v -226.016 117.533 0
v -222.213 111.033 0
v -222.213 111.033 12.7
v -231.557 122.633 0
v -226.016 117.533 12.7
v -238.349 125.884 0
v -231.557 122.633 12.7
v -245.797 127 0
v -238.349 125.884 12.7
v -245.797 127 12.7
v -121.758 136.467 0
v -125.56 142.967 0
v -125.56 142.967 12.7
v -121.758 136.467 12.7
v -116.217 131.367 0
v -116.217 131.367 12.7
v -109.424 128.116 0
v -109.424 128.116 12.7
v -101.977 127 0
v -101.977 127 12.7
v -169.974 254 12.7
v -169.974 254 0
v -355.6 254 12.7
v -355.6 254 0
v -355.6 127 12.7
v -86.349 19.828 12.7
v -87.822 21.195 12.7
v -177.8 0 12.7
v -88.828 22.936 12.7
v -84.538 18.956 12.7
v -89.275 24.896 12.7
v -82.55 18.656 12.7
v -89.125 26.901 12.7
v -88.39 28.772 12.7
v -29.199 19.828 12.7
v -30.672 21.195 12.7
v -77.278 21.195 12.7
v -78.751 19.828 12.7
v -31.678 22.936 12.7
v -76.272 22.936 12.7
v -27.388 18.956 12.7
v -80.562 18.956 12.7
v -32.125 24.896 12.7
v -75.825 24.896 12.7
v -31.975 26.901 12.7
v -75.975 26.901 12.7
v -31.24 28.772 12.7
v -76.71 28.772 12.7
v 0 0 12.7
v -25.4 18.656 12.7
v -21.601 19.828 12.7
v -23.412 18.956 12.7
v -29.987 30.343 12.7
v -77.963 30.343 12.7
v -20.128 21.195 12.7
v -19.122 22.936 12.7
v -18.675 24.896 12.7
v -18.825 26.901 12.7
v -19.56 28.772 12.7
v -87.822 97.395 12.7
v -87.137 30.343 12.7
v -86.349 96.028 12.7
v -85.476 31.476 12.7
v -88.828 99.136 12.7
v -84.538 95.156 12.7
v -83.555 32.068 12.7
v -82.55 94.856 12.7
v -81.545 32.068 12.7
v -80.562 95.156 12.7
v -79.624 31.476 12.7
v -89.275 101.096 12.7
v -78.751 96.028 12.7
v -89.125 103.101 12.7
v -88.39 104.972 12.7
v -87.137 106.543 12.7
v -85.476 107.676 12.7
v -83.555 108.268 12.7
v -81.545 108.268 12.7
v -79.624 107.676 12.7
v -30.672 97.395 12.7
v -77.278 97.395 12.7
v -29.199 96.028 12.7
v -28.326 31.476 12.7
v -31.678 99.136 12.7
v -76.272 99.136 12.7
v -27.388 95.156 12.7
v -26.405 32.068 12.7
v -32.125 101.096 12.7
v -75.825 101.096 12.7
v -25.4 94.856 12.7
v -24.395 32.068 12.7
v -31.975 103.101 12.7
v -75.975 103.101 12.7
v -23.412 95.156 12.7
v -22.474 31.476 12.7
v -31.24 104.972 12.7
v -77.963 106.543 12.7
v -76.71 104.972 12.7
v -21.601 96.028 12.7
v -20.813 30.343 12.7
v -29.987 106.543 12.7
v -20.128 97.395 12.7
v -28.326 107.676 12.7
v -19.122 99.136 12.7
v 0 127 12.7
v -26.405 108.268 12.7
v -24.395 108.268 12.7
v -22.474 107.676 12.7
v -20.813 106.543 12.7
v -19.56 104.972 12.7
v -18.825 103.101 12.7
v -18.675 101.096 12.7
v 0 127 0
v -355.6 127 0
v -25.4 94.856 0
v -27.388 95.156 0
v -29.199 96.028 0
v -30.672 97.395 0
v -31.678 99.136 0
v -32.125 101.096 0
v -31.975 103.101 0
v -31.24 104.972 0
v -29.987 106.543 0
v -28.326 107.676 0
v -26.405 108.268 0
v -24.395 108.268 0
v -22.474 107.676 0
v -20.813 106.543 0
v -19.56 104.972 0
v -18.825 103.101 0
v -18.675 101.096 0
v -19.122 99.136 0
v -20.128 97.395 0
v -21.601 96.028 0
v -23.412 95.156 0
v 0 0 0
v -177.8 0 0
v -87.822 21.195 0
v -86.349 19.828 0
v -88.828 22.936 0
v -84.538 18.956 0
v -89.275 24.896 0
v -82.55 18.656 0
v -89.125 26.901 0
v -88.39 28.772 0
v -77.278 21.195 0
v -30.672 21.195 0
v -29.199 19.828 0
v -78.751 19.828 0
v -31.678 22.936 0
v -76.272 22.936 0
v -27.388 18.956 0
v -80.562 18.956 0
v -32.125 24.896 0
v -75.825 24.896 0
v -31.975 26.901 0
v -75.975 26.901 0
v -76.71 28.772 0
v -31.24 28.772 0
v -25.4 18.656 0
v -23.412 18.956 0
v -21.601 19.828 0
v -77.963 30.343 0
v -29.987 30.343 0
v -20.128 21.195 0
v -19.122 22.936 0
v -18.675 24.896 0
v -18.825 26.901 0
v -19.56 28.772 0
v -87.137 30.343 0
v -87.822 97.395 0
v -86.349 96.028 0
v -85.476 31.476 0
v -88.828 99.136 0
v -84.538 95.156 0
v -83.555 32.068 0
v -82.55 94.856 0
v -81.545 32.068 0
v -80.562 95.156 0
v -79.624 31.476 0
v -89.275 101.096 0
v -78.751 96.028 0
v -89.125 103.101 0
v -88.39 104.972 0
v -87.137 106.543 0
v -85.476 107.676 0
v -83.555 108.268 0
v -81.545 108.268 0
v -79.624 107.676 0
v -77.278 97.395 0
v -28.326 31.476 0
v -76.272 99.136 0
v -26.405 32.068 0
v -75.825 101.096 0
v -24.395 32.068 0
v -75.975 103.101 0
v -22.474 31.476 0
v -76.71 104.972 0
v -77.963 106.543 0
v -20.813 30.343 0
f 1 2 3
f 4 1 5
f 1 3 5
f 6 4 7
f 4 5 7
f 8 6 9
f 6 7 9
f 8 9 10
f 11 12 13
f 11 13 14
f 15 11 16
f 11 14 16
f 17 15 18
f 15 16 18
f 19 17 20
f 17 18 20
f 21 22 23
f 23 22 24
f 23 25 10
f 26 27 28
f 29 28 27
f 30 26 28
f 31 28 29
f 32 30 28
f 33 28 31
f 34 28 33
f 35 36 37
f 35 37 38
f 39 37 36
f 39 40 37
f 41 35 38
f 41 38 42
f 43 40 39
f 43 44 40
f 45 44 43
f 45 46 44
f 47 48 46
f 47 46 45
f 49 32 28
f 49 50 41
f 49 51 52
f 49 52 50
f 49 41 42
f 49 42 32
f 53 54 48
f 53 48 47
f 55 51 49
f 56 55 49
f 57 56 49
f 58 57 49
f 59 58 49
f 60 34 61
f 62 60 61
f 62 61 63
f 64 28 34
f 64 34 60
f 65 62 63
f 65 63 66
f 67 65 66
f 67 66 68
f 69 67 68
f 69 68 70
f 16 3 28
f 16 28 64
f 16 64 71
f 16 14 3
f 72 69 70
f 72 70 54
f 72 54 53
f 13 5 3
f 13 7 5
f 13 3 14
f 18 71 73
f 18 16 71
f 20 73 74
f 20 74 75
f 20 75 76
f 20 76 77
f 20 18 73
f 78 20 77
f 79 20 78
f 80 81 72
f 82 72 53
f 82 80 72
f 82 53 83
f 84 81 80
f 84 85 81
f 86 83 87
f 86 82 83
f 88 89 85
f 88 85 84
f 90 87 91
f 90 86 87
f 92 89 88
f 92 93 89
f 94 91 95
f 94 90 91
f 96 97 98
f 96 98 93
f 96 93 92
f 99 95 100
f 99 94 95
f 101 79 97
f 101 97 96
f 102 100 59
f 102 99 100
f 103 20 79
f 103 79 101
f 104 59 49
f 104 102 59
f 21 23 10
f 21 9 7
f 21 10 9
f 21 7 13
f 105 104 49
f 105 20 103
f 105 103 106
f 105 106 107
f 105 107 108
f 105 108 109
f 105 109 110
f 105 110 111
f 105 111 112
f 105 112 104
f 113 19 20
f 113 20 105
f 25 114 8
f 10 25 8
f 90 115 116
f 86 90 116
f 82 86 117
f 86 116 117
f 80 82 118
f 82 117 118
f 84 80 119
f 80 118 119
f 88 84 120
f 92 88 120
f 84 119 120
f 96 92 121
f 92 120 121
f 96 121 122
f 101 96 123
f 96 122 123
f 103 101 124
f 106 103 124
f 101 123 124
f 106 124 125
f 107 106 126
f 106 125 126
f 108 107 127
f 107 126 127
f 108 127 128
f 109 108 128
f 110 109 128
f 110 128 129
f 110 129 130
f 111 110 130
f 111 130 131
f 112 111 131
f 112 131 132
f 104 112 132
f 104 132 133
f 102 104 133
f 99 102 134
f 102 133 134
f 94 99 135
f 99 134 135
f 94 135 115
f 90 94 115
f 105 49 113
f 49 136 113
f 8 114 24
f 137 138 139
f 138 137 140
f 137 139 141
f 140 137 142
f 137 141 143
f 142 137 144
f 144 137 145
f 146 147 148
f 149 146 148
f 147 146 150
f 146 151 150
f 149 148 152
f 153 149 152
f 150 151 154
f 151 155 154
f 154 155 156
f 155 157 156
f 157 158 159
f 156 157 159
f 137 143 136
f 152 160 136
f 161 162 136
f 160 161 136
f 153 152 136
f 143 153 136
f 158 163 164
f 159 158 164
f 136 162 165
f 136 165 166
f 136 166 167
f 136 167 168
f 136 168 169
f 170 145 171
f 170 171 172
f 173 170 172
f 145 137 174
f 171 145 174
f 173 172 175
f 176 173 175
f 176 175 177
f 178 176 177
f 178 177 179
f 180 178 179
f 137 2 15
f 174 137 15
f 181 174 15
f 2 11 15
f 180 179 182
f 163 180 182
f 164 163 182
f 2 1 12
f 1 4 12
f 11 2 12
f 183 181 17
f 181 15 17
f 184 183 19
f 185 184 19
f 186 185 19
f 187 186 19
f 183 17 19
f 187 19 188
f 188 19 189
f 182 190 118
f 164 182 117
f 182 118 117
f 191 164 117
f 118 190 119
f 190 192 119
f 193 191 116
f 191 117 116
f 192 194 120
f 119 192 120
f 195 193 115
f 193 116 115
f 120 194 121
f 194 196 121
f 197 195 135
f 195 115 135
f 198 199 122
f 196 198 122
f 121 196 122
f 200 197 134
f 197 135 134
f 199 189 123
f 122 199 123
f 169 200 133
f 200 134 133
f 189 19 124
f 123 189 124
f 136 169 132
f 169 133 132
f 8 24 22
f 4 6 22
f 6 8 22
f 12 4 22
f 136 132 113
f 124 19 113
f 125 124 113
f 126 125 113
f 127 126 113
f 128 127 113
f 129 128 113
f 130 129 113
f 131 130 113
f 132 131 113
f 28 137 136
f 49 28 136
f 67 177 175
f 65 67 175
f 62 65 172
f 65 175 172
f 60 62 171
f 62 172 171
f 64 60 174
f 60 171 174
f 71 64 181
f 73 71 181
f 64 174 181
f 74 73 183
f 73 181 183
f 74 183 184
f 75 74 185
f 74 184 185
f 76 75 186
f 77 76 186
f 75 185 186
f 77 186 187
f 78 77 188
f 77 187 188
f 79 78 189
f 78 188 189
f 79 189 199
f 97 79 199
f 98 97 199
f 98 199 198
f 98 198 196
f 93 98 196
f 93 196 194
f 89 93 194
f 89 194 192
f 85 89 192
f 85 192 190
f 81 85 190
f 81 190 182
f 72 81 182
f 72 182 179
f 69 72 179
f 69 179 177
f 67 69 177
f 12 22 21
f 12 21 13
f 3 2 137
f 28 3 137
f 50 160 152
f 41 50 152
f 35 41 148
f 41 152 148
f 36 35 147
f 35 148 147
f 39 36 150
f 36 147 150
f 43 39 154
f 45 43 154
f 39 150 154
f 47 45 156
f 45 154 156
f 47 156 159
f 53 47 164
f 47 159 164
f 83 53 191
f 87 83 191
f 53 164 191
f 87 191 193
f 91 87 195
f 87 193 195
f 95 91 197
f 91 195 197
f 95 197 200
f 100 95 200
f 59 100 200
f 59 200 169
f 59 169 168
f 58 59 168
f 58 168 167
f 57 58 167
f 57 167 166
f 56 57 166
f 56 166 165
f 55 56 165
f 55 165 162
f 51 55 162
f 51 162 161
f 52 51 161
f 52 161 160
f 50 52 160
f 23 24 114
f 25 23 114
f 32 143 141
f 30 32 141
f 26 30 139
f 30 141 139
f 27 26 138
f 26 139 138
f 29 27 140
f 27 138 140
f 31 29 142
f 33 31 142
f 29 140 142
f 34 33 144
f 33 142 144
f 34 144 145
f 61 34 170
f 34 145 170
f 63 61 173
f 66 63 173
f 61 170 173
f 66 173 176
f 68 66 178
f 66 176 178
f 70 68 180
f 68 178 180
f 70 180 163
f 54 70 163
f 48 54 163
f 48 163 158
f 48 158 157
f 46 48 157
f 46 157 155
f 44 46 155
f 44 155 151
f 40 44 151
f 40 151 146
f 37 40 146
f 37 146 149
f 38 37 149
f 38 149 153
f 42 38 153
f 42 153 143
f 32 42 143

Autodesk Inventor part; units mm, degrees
ref_plane "YZ Plane" through (0, 0, 0) normal (1, 0, 0) x (0, 1, 0)
ref_plane "XZ Plane" through (0, 0, 0) normal (0, 1, 0) x (-1, 0, 0)
ref_plane "XY Plane" through (0, 0, 0) normal (0, 0, 1) x (1, 0, 0)
sketch "Sketch1" plane through (0, 0, 0) normal (0, 0, 1) x (1, 0, 0)
  line L0 (-177.8, 0) -> (0, 0)
  line L1 (0, 0) -> (0, 127)
  line L2 (-169.9735, 254) -> (-355.6, 254)
  line L3 (-355.6, 254) -> (-355.6, 127)
  line L4 (-355.6, 127) -> (-228.6, 127)
  line L5 (-228.6, 127) -> (-177.8, 0)
  line L6 (-169.9735, 254) -> (-119.1735, 127)
  line L7 (-119.1735, 127) -> (0, 127)
  dimension "d8" = 127
  dimension "brkt_ht" = 254
  dimension "brkt_width" = 355.6
  dimension "d11" = 127
  dimension "d12" = 101.6
  dimension "d13" = 111.801
  dimension "d15" = 177.8
extrude "Extrusion1" add sketch "Sketch1" along normal blind 12.7
fillet "Fillet1" radius 25.4 2 edges at (-228.6, 127, 6.35) (-119.1735, 127, 6.35)
sketch "Sketch4" plane through (0, 0, 12.7) normal (0, 0, 1) x (1, 0, 0)
  line L0 (-25.4, 101.6) -> (-82.55, 101.6) construction
  line L1 (-82.55, 101.6) -> (-82.55, 25.4) construction
  line L2 (-82.55, 25.4) -> (-25.4, 25.4) construction
  line L3 (-25.4, 25.4) -> (-25.4, 101.6) construction
  line L4 (0, 0) -> (0, 127) construction
  line L5 (0, 127) -> (-101.9768, 127) construction
  point P0 (-25.4, 63.5)
  point P1 (0, 63.5)
  dimension "d19" = 25.4
  dimension "d20" = 25.4
  dimension "d21" = 57.15
hole "Hole1" at (-25.4, 101.6, 12.7) at (-82.55, 101.6, 12.7) at (-82.55, 25.4, 12.7) at (-25.4, 25.4, 12.7) direction (0, 0, -1) diameter 13.4874 end through all clearance for "Hex Head Bolt" size "1/2" standard "Ansi Unified Screw Threads"
equation "\"d15\" = 0.5 * brkt_width"
properties part number "884702-01"
